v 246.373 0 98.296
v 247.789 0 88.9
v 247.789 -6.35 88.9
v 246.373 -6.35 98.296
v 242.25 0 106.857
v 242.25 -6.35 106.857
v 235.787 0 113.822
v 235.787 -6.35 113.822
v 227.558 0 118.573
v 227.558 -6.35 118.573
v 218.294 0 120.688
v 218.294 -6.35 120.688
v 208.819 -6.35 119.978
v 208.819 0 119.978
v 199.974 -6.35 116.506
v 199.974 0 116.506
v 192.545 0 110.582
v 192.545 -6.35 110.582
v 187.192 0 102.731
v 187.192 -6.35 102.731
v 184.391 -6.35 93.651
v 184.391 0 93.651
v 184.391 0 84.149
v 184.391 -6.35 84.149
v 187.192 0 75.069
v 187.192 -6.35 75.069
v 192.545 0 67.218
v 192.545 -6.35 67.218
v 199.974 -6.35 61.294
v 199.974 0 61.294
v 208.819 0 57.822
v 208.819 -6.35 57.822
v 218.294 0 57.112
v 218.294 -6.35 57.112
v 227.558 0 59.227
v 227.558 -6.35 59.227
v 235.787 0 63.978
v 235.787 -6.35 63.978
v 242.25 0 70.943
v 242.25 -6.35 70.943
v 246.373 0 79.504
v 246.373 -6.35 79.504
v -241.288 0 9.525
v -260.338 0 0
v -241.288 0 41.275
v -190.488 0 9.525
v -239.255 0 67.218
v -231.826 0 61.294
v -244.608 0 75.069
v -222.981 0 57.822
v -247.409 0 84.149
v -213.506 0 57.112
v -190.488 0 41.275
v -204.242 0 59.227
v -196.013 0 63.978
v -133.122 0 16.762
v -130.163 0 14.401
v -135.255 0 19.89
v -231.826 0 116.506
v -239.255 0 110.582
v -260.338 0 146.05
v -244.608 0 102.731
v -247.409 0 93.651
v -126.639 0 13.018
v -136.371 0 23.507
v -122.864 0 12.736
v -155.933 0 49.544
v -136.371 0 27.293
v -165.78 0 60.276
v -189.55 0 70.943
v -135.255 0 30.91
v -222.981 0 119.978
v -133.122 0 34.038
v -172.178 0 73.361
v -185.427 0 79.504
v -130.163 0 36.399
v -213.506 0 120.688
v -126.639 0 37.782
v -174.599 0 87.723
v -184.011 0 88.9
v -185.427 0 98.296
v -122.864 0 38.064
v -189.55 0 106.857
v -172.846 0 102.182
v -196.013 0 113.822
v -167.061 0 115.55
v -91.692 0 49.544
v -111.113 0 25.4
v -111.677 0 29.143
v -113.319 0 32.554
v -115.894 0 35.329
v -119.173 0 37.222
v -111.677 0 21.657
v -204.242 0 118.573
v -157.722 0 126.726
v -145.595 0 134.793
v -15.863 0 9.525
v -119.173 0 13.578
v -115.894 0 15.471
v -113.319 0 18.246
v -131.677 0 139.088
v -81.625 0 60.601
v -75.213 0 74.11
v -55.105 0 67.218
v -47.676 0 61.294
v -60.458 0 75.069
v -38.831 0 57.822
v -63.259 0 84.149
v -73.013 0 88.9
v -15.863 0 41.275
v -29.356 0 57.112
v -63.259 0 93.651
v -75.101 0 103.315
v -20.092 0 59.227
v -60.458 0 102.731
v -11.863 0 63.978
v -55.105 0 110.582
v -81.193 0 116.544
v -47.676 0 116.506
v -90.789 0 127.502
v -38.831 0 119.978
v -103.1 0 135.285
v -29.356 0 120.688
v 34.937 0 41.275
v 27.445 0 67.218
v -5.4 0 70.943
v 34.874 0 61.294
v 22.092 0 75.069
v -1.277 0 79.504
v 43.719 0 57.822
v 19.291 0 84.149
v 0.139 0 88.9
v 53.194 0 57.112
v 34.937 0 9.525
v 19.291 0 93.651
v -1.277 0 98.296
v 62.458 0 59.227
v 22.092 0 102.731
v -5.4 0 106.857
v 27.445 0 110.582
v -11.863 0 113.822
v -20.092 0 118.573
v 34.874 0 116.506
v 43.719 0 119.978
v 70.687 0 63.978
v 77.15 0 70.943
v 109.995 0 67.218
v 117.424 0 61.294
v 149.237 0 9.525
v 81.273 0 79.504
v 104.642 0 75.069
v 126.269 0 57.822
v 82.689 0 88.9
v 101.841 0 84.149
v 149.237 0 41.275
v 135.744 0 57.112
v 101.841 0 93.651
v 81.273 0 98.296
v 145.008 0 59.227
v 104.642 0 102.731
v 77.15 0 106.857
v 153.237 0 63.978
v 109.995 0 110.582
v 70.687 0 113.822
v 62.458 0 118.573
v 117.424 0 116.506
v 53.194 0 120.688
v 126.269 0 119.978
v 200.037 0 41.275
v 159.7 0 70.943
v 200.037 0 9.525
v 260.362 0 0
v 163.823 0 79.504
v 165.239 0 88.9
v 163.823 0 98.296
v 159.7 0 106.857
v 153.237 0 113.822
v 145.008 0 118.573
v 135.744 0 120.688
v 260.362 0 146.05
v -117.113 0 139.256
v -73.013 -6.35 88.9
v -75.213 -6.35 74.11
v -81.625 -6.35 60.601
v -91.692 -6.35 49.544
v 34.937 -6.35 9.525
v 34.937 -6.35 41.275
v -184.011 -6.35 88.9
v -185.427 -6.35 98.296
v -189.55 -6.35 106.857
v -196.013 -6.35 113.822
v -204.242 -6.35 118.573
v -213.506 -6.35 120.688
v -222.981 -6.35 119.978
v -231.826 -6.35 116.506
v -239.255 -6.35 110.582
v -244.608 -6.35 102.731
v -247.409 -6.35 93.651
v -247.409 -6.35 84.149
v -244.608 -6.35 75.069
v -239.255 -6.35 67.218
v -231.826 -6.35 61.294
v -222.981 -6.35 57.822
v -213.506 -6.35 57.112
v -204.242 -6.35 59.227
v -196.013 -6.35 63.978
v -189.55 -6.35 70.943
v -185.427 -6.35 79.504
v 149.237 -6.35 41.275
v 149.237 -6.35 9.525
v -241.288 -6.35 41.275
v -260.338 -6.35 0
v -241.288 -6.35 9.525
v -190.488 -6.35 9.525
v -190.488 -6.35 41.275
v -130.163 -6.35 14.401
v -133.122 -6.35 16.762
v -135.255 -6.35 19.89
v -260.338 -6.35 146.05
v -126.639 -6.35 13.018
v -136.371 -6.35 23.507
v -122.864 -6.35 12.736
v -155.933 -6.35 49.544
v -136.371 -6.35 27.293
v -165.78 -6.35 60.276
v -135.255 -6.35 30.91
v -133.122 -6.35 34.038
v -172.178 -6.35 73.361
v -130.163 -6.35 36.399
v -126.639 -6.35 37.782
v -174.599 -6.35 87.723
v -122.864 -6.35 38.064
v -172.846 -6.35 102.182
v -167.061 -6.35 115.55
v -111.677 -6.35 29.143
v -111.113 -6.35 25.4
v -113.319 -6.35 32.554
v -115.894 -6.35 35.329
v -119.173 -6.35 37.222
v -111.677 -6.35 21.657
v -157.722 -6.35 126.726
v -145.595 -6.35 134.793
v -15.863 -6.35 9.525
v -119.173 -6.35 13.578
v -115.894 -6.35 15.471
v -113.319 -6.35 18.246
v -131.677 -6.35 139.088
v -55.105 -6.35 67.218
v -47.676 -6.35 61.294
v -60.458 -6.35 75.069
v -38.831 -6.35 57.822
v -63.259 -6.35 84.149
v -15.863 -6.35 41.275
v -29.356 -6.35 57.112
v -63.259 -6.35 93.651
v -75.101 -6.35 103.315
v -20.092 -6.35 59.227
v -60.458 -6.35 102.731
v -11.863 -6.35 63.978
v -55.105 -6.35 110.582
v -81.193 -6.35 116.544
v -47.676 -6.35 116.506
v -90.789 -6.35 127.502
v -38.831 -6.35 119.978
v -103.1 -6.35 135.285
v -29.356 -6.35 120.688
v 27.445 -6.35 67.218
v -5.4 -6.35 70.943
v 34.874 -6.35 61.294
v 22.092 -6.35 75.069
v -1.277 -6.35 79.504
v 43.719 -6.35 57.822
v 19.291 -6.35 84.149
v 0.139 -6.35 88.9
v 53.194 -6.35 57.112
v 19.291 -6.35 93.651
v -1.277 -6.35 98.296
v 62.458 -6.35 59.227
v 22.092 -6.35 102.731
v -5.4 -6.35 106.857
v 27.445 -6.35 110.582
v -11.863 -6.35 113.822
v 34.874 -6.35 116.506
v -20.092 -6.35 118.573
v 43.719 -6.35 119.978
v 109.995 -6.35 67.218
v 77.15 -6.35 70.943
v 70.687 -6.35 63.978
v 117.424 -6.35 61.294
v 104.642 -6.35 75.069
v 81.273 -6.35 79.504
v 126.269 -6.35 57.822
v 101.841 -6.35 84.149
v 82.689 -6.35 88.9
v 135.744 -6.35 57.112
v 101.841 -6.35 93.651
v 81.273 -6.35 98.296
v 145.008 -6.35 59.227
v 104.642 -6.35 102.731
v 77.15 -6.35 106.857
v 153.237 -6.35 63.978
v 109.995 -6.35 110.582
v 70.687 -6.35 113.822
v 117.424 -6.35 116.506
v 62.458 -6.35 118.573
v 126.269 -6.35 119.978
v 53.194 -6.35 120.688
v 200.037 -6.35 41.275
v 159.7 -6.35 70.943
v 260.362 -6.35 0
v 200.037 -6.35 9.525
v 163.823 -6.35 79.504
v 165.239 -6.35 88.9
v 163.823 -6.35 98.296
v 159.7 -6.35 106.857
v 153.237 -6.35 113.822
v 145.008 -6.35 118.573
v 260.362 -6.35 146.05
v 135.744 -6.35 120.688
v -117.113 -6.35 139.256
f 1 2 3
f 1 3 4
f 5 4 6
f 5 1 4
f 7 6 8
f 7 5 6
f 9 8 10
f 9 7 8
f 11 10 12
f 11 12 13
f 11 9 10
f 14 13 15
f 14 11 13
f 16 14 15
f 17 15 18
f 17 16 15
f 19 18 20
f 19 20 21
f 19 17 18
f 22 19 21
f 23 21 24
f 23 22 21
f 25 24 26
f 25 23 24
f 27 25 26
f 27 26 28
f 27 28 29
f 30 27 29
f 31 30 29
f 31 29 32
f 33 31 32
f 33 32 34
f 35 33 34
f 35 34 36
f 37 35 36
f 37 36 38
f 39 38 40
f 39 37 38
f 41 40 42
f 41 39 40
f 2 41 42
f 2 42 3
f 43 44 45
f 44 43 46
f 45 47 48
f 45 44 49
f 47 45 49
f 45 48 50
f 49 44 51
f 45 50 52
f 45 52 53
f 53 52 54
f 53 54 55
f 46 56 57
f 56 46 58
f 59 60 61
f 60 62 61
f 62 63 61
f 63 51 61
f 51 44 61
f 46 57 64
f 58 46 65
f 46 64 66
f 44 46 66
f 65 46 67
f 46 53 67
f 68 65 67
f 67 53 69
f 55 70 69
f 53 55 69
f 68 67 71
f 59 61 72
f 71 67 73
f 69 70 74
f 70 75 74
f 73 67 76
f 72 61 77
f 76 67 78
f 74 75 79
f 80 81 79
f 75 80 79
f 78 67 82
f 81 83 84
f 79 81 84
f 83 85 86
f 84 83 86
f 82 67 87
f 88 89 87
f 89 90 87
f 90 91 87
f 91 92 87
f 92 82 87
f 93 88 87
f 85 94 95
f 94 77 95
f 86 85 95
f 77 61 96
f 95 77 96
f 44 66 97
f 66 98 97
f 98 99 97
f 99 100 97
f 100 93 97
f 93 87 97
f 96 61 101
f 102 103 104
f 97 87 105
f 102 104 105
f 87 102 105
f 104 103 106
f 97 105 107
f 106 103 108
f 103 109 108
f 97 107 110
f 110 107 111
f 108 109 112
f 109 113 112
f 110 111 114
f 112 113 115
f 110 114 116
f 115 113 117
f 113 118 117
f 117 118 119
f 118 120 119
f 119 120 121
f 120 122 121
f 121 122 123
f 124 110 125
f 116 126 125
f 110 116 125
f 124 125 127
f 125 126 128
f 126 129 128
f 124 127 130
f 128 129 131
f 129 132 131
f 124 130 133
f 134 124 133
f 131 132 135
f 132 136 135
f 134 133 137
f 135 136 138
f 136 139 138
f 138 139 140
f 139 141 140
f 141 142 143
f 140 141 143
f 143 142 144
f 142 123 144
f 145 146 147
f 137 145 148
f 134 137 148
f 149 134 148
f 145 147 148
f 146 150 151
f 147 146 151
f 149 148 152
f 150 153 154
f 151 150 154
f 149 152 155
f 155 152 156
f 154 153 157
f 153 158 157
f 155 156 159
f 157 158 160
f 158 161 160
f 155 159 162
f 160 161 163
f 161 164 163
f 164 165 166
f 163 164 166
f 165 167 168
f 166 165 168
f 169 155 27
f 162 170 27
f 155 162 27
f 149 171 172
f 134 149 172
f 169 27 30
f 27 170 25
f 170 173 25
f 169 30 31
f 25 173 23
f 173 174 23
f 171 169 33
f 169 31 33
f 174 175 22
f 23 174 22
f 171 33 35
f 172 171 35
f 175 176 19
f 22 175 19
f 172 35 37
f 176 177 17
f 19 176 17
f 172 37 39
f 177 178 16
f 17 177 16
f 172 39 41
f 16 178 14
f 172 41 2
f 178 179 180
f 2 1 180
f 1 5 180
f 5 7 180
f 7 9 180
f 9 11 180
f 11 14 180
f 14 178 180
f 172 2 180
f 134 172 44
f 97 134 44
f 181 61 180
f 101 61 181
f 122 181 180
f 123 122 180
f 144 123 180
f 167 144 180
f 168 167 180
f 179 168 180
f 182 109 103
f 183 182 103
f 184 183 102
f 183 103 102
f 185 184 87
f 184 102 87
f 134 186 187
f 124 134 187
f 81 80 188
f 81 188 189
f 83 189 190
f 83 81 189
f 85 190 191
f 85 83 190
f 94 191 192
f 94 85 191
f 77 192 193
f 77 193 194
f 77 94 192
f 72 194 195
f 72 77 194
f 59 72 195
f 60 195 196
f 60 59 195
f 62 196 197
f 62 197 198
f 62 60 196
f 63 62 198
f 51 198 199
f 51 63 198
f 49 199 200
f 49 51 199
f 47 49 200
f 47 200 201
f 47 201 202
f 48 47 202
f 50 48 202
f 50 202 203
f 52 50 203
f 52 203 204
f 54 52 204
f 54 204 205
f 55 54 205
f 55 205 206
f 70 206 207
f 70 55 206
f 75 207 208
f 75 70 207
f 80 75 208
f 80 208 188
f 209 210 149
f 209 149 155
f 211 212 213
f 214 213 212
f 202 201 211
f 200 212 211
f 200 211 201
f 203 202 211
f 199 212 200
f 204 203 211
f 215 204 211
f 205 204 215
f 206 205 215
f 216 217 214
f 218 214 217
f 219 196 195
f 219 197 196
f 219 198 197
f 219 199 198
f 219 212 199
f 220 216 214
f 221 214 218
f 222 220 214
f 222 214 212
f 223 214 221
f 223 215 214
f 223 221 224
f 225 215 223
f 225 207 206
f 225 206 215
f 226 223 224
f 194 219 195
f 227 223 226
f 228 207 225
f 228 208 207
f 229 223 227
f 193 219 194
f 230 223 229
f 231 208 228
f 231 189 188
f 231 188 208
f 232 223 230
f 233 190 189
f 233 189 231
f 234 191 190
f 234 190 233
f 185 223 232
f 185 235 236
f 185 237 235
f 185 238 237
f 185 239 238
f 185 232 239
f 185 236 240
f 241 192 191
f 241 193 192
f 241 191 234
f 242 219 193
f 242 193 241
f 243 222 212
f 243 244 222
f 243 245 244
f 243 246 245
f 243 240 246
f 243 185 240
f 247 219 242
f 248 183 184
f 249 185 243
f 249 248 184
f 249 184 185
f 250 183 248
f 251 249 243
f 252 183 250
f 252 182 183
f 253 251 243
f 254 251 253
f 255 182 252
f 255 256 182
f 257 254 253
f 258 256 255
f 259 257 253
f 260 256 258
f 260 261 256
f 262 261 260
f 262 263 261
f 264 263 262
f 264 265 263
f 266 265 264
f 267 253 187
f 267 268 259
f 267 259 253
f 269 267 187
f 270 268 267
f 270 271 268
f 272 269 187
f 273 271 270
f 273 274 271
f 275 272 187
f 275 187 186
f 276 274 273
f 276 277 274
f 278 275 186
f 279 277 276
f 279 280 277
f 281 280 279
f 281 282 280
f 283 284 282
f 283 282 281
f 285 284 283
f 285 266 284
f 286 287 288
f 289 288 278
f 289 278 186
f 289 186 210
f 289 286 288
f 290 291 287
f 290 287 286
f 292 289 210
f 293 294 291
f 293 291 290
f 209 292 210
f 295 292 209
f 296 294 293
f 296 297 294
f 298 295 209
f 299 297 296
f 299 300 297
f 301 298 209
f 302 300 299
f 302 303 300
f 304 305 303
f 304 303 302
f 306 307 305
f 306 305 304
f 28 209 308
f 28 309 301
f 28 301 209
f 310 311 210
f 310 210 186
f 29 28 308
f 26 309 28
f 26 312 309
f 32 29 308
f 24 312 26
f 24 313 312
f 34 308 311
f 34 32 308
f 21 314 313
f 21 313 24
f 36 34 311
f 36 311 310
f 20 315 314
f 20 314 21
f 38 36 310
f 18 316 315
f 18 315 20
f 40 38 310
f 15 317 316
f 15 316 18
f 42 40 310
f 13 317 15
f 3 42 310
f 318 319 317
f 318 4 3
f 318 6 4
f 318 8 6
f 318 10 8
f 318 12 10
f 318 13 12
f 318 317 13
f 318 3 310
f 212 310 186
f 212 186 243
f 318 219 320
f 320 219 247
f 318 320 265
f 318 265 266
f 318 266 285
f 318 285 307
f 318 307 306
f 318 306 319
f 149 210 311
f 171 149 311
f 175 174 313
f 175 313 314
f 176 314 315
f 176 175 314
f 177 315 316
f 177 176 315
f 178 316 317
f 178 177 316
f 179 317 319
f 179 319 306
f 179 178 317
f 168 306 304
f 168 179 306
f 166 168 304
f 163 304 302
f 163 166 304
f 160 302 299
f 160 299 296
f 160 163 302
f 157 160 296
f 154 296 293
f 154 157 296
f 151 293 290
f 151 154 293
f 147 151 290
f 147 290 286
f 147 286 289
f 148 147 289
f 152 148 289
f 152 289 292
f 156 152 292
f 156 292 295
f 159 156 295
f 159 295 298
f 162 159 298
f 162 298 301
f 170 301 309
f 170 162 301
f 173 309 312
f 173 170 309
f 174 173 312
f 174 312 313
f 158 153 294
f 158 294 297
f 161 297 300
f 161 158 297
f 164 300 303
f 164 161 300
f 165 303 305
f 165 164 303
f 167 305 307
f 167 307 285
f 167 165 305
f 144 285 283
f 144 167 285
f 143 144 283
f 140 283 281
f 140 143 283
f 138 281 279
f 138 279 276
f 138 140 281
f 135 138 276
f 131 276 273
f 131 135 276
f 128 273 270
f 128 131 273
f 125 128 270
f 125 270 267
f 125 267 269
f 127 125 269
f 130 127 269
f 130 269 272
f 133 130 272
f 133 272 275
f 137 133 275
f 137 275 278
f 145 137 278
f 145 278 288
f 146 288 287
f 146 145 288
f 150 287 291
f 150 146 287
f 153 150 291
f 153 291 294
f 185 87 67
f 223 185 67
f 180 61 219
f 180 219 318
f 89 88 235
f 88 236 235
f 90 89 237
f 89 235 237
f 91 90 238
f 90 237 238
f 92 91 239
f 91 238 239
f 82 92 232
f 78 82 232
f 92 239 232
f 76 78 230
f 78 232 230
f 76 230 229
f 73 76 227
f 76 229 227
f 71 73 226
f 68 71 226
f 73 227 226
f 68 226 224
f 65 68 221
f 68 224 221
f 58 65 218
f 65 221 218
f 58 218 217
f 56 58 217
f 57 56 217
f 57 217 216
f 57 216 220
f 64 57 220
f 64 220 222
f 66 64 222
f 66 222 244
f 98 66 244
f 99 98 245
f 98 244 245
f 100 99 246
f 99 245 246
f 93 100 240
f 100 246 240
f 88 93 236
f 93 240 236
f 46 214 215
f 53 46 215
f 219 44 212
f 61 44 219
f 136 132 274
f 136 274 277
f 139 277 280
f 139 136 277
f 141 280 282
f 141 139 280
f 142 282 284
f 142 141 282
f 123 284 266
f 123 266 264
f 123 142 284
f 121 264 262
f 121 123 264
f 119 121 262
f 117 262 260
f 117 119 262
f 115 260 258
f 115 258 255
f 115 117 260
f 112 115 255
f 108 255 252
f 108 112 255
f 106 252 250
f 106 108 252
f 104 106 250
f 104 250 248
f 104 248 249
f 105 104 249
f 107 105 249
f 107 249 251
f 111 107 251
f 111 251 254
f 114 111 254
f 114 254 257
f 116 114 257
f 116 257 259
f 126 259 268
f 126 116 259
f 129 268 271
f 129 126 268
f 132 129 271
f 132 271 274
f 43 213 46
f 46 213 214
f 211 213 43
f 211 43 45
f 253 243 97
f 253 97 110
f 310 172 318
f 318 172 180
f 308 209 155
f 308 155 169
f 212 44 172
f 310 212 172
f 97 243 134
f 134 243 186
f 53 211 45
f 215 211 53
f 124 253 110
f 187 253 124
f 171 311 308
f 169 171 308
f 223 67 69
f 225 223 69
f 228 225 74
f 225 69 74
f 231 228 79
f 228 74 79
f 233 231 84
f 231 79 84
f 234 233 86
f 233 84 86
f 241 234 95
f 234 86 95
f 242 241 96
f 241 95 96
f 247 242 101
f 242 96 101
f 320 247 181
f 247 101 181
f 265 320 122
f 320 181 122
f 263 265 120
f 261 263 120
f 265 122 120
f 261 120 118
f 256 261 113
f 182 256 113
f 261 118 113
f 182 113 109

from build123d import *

# Parameters (mm, degrees)
F0_W      = 520.7
F0_H      = 146.05
F0_R      = 31.877
F1_DEPTH  = 6.35
F2_DEPTH  = 6.35
F3_R      = 10.0959291711
F3_R_2    = 9.3516208714
F3_R_3    = 9.399866871
F4_DEPTH  = 25.4
F5_R      = 2.413
F6_DEPTH  = 25.4
F7_W      = 6.35
F7_H      = 6.35
F8_DEPTH  = 25.4
F9_W      = 50.8
F9_H      = 31.75
F10_DEPTH = 25.4
F11_R     = 12.7
F12_DEPTH = 12.7


# Not quite as in the source:
# - a feature names something its author has since deleted; it is built from what else it names


with BuildPart() as f1:
    # F0 (on Front) → F1 (new body)
    with BuildSketch(Plane.XZ):
        with Locations((0.0123051805, 73.0250019237)):
            Rectangle(F0_W, F0_H)
        with Locations((-215.8876948195, 88.9000019237)):
            Circle(F0_R, mode=Mode.SUBTRACT)
        with BuildLine():
            ThreePointArc((-155.9332892075, 49.5438408284), (-145.5947264636, 134.7931724118), (-73.0126948195, 88.9000019237))
            ThreePointArc((-73.0126948195, 88.9000019237), (-77.9195243313, 67.1179702796), (-91.6921004315, 49.5438408284))
            ThreePointArc((-91.6921004315, 49.5438408284), (-123.8126948195, 38.1000019237), (-155.9332892075, 49.5438408284))
        make_face(mode=Mode.SUBTRACT)
        with Locations((-31.7376948195, 88.9000019237)):
            Circle(F0_R, mode=Mode.SUBTRACT)
        with Locations((50.8123051805, 88.9000019237)):
            Circle(F0_R, mode=Mode.SUBTRACT)
        with Locations((133.3623051805, 88.9000019237)):
            Circle(F0_R, mode=Mode.SUBTRACT)
        with Locations((215.9123051805, 88.9000019237)):
            Circle(F0_R, mode=Mode.SUBTRACT)
    extrude(amount=F1_DEPTH)

    # F0 (on Front) → F2 (join)
    with BuildSketch(Plane.XZ):
        with BuildLine():
            Line((-91.6921004315, 49.5438408284), (-155.9332892075, 49.5438408284))
            ThreePointArc((-155.9332892075, 49.5438408284), (-123.8126948195, 38.1000019237), (-91.6921004315, 49.5438408284))
        make_face()
    extrude(amount=F2_DEPTH)

    # F3 (on face) → F4 (cut)
    with BuildSketch(Plane.XZ.offset(6.35)):
        with Locations((-215.8876948195, 25.4000019237)):
            Circle(F3_R)
        with Locations((9.5373051805, 25.4000019237)):
            Circle(F3_R_2)
        with Locations((174.6373051805, 25.4000019237)):
            Circle(F3_R_3)
    extrude(amount=-F4_DEPTH, mode=Mode.SUBTRACT)

    # F5 (on face) → F6 (cut)
    with BuildSketch(Plane.XZ.offset(6.35)):
        with Locations((-155.5626948195, 120.6500019237)):
            Circle(F5_R)
        with Locations((-92.0626948195, 120.6500019237)):
            Circle(F5_R)
        with Locations((-92.0626948195, 57.1500019237)):
            Circle(F5_R)
        with Locations((-155.5626948195, 57.1500019237)):
            Circle(F5_R)
    extrude(amount=-F6_DEPTH, mode=Mode.SUBTRACT)

    # F7 (on face) → F8 (cut)
    with BuildSketch(Plane.XZ.offset(6.35)):
        with Locations((-269.875, 142.875)):
            Rectangle(F7_W, F7_H)
        with Locations((269.875, 142.875)):
            Rectangle(F7_W, F7_H)
    extrude(amount=-F8_DEPTH, mode=Mode.SUBTRACT)

    # F9 (on face) → F10 (cut)
    with BuildSketch(Plane.XZ.offset(6.35)):
        with Locations((-215.8876948195, 25.4000019237)):
            Rectangle(F9_W, F9_H)
        with Locations((9.5373051805, 25.4000019237)):
            Rectangle(F9_W, F9_H)
        with Locations((174.6373051805, 25.4000019237)):
            Rectangle(F9_W, F9_H)
    extrude(amount=-F10_DEPTH, mode=Mode.SUBTRACT)

    # F11 (on face) → F12 (cut, symmetric)
    with BuildSketch(Plane.XZ.offset(6.35)):
        with Locations((-123.8126948195, 25.4000019237)):
            Circle(F11_R)
    extrude(amount=F12_DEPTH, both=True, mode=Mode.SUBTRACT)


solid = f1.part
